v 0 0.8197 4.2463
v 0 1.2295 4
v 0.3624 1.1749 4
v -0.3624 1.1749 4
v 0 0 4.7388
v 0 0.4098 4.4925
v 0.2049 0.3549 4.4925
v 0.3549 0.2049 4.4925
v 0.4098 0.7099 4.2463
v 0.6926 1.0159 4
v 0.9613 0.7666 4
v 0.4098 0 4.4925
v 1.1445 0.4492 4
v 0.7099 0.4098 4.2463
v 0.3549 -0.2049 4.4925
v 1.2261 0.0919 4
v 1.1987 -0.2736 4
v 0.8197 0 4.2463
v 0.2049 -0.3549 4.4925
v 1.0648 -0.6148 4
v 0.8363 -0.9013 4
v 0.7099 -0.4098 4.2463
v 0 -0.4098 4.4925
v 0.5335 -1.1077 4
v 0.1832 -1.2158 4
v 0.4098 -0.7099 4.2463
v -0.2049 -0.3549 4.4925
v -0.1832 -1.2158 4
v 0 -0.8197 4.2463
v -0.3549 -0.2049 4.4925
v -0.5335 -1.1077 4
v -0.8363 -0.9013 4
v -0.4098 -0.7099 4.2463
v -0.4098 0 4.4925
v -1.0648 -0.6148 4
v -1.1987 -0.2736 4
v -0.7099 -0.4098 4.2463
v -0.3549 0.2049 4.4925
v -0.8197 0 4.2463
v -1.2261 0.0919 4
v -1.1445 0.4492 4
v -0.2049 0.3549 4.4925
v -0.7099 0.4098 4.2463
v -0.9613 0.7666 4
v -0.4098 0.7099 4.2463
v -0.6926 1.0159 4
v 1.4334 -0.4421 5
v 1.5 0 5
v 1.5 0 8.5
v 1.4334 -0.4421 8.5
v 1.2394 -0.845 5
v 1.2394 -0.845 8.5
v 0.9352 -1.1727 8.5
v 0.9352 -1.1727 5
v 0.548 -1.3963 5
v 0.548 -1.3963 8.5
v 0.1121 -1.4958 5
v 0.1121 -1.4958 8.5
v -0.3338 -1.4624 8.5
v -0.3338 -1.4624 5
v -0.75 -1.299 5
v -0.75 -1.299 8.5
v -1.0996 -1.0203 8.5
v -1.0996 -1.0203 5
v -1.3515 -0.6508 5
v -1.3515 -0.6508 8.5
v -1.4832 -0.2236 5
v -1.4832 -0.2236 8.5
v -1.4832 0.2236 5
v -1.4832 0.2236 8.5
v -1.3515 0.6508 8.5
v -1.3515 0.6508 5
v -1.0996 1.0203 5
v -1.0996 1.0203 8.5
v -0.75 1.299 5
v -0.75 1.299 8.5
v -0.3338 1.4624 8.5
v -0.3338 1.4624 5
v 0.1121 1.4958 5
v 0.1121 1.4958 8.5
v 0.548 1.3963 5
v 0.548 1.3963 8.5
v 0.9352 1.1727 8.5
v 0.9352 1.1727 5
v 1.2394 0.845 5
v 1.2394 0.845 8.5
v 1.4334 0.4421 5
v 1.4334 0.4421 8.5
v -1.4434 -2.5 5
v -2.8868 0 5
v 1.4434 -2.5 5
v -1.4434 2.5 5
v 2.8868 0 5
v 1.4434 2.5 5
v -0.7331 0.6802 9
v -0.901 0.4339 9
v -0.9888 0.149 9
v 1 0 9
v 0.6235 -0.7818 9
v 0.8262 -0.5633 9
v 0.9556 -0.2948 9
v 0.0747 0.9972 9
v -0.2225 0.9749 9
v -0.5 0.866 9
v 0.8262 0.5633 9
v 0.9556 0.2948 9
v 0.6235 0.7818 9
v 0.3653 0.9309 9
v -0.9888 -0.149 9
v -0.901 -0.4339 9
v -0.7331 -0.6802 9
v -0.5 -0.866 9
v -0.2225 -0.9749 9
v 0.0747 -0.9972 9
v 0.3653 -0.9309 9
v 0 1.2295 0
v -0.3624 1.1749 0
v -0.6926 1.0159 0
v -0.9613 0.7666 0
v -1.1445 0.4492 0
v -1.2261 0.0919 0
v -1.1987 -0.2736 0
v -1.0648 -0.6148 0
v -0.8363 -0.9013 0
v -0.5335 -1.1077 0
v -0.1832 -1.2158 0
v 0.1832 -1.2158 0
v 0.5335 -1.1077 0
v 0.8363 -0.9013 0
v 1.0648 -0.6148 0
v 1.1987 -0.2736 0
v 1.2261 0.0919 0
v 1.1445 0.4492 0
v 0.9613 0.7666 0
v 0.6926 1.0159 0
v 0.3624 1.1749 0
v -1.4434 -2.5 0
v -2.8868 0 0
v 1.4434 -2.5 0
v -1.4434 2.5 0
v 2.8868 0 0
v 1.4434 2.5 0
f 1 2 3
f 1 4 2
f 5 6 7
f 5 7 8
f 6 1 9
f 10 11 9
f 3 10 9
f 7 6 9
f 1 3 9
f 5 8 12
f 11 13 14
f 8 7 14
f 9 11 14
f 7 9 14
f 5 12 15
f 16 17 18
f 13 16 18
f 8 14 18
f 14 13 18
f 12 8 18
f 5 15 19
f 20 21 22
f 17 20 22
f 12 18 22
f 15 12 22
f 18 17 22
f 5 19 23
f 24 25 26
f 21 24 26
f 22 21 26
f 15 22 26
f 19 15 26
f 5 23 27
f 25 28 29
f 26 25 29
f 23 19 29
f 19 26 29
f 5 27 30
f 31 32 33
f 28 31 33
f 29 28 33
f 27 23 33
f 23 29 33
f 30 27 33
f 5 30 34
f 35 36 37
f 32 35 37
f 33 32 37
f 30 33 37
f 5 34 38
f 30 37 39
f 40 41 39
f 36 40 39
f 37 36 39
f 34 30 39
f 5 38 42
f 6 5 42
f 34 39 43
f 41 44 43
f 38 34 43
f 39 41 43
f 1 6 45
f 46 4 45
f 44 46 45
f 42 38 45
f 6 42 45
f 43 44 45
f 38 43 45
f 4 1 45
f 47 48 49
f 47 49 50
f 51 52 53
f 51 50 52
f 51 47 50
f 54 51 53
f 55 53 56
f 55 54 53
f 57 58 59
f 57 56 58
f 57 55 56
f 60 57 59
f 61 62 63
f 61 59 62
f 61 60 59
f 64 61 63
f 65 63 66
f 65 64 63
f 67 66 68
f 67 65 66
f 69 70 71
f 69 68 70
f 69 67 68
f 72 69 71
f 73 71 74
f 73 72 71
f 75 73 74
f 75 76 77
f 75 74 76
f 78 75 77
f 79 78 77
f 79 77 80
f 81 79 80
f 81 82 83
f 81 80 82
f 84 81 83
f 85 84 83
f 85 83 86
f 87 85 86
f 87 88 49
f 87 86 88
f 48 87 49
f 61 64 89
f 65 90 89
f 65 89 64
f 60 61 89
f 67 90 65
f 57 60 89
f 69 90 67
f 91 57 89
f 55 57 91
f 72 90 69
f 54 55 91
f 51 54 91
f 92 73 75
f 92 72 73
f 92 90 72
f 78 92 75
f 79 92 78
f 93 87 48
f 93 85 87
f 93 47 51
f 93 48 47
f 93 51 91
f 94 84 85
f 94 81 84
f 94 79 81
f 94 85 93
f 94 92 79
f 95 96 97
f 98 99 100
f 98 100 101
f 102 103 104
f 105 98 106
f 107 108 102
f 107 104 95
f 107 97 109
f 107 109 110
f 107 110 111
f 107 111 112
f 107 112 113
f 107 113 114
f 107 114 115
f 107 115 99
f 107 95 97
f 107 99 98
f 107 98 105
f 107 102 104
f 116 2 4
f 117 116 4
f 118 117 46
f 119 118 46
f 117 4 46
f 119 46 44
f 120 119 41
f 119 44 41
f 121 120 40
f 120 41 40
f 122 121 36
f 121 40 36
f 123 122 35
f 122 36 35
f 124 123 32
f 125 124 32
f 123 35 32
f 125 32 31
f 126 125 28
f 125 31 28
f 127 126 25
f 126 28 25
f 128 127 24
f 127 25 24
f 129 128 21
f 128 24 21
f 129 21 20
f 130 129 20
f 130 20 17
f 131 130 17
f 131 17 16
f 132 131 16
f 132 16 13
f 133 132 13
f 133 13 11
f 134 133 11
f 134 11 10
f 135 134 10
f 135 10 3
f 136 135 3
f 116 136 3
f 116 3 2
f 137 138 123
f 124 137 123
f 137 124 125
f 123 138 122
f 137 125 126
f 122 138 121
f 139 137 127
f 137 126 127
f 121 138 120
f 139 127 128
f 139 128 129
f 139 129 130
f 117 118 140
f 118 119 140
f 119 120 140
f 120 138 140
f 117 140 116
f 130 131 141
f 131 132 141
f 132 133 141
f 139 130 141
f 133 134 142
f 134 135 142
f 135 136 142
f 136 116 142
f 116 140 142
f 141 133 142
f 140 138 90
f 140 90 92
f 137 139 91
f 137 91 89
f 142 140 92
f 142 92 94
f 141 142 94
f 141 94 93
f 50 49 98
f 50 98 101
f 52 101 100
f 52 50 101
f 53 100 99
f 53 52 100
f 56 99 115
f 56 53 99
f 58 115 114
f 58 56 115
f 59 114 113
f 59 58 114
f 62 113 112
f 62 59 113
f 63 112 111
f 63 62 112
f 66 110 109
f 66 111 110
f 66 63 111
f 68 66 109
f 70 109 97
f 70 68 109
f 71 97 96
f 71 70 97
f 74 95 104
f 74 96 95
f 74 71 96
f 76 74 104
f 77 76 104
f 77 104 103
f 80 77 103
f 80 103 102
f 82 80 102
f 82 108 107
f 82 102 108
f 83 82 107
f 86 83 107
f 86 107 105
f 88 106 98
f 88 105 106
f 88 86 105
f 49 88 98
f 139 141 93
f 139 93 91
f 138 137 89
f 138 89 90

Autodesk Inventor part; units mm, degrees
ref_plane "YZ Plane" through (0, 0, 0) normal (1, 0, 0) x (0, 1, 0)
ref_plane "XZ Plane" through (0, 0, 0) normal (0, 1, 0) x (-1, 0, 0)
ref_plane "XY Plane" through (0, 0, 0) normal (0, 0, 1) x (1, 0, 0)
sketch "Sketch1" plane through (0, 0, 0) normal (0, 0, 1) x (1, 0, 0)
  line L0 (2.8868, 0) -> (1.4434, -2.5)
  line L1 (1.4434, -2.5) -> (-1.4434, -2.5)
  line L2 (-1.4434, -2.5) -> (-2.8868, 0)
  line L3 (-2.8868, 0) -> (-1.4434, 2.5)
  line L4 (-1.4434, 2.5) -> (1.4434, 2.5)
  line L5 (1.4434, 2.5) -> (2.8868, 0)
  point P0 (0, 0)
  point P1 (0, 0)
  dimension "d0" = 5
extrude "Extrusion1" add sketch "Sketch1" along normal blind 5
sketch "Sketch2" plane through (0, 0, 5) normal (0, 0, 1) x (1, 0, 0)
  circle A0 centre (0, 0) radius 1.5
  dimension "d3" = 3
extrude "Extrusion2" add sketch "Sketch2" along normal blind 4
chamfer "Chamfer1" distance 0.5 angle 45 1 edges at (-1.5, 0, 9)
thread "Thread1" size "M3x0.5" class "6g" standard "ANSI Metric M Profile" full length
sketch "Sketch3" plane through (0, 0, 0) normal (0, 0, -1) x (-1, 0, 0)
  point P0 (0, 0)
  point P1 (0, 0)
hole "Hole1" at (0, 0, 0) direction (0, 0, 1) diameter 2.459 depth 4 tip angle 118 thread size "M3x0.5" class "6H" standard "ISO Metric profile"
properties part number "Abstandshalter_5mm" material "Stainless Steel"
